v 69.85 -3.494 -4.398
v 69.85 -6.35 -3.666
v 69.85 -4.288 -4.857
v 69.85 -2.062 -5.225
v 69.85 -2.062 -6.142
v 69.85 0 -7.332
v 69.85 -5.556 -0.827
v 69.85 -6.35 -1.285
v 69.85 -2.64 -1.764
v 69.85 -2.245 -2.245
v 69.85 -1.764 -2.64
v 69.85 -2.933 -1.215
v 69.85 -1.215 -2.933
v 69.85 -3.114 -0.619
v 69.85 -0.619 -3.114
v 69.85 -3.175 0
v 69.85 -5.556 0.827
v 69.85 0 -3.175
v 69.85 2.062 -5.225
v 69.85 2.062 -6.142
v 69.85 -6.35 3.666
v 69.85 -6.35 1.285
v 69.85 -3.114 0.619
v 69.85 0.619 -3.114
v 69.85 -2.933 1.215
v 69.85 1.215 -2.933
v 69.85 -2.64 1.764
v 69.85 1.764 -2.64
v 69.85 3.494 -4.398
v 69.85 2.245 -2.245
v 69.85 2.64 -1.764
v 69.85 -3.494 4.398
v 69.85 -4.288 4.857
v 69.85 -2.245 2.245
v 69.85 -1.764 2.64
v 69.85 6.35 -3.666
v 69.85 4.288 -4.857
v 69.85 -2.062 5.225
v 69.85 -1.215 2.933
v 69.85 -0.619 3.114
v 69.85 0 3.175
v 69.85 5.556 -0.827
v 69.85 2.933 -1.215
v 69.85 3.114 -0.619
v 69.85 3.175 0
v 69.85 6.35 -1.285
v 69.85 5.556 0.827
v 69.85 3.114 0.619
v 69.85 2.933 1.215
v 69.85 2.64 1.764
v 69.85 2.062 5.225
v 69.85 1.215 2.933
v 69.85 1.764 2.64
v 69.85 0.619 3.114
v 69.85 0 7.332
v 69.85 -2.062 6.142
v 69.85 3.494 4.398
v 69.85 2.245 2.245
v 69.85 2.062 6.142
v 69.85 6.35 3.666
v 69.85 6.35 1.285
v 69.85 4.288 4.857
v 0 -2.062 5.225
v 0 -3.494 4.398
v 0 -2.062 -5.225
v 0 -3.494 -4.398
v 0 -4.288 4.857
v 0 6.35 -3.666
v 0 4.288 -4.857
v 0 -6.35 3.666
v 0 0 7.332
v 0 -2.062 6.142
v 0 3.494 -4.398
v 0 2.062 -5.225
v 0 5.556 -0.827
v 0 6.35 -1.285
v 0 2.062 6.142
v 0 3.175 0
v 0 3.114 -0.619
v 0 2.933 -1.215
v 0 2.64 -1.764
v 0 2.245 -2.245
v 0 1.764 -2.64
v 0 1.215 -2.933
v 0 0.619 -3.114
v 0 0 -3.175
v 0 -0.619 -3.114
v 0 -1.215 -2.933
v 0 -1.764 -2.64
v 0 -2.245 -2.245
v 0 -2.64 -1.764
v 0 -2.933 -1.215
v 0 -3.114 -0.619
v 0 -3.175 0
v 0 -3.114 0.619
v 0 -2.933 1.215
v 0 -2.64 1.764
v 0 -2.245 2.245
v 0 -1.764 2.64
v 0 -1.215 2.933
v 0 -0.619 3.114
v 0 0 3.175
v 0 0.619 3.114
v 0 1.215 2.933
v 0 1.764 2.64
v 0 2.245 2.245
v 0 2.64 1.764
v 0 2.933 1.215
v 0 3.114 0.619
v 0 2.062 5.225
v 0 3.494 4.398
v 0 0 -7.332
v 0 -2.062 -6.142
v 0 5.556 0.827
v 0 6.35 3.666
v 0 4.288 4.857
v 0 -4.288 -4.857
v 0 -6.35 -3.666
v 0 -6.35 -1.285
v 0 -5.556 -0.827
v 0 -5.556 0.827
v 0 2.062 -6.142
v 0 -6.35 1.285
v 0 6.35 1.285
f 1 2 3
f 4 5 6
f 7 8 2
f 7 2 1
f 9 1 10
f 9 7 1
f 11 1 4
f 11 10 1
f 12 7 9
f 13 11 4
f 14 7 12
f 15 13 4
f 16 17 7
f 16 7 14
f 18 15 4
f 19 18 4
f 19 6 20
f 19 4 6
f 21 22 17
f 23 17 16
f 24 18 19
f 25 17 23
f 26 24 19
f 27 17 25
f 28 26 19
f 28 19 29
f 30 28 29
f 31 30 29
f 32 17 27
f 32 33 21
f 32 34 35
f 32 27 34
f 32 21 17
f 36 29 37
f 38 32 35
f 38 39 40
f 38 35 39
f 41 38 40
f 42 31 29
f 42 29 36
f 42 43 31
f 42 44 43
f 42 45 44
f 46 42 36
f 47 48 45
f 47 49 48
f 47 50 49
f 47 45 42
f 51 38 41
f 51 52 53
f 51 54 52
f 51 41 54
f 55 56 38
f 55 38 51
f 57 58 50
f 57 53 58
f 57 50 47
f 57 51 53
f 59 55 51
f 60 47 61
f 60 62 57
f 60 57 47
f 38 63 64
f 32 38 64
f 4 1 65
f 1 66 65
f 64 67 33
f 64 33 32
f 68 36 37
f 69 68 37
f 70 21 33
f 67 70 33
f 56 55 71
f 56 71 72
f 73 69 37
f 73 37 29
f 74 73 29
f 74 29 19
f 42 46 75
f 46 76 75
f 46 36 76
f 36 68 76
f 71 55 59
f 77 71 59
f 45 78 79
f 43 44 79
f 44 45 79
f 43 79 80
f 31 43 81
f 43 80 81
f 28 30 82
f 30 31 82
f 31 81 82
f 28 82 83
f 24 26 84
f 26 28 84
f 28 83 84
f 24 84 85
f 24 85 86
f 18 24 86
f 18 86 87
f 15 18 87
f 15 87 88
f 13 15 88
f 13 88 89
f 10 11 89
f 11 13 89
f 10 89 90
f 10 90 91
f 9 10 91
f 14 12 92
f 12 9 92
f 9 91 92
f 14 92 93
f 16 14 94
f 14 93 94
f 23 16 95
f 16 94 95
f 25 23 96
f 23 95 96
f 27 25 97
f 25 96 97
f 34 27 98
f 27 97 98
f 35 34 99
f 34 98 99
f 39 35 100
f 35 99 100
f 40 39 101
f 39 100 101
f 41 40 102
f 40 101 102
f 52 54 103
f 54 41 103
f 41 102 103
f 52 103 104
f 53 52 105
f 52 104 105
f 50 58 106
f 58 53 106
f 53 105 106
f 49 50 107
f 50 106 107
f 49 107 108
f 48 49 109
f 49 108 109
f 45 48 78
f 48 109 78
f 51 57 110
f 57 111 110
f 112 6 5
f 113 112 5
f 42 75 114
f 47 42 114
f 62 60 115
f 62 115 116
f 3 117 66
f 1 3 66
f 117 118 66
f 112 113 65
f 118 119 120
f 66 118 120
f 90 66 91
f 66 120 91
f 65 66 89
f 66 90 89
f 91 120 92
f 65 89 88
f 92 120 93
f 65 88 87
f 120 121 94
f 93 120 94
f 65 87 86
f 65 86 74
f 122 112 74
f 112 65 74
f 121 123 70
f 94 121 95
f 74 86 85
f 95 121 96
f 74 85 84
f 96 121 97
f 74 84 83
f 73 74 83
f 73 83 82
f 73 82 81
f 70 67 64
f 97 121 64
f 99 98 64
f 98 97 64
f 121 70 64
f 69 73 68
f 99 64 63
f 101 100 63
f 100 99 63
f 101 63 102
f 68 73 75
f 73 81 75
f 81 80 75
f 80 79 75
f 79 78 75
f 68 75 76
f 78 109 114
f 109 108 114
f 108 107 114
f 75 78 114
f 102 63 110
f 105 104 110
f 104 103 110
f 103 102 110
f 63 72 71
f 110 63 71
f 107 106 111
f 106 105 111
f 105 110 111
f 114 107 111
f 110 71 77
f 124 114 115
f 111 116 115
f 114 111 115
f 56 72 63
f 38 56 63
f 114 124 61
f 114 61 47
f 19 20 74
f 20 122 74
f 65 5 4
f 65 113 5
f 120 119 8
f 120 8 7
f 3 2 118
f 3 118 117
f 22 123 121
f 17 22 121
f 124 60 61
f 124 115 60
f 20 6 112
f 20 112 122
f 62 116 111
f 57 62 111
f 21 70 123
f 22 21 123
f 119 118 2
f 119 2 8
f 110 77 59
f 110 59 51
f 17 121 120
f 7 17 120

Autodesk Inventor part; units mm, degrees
ref_plane "YZ Plane" through (0, 0, 0) normal (1, 0, 0) x (0, 1, 0)
ref_plane "XZ Plane" through (0, 0, 0) normal (0, 1, 0) x (-1, 0, 0)
ref_plane "XY Plane" through (0, 0, 0) normal (0, 0, 1) x (1, 0, 0)
sketch "Sketch1" plane through (0, 0, 0) normal (1, 0, 0) x (0, 1, 0)
  line L0 (6.35, 3.6662) -> (6.35, -3.6662) construction
  line L1 (6.35, -3.6662) -> (0, -7.3323) construction
  line L2 (0, -7.3323) -> (-6.35, -3.6662) construction
  line L3 (-6.35, -3.6662) -> (-6.35, 3.6662) construction
  line L4 (-6.35, 3.6662) -> (0, 7.3323) construction
  line L5 (0, 7.3323) -> (6.35, 3.6662) construction
  line L6 (5.5563, -3.2079) -> (5.5563, 3.2079) construction
  line L7 (5.5563, 3.2079) -> (0, 6.4158) construction
  line L8 (0, 6.4158) -> (-5.5563, 3.2079) construction
  line L9 (-5.5563, 3.2079) -> (-5.5563, -3.2079) construction
  line L10 (-5.5563, -3.2079) -> (0, -6.4158) construction
  line L11 (0, -6.4158) -> (5.5563, -3.2079) construction
  line L12 (6.35, 3.6662) -> (6.35, 1.2849)
  line L13 (6.35, 3.6662) -> (4.2878, 4.8568)
  line L14 (6.35, -3.6662) -> (6.35, -1.2849)
  line L15 (6.35, -3.6662) -> (4.2878, -4.8568)
  line L16 (0, -7.3323) -> (2.0622, -6.1417)
  line L17 (0, -7.3323) -> (-2.0622, -6.1417)
  line L18 (-6.35, -3.6662) -> (-4.2878, -4.8568)
  line L19 (-6.35, -3.6662) -> (-6.35, -1.2849)
  line L20 (-6.35, 3.6662) -> (-6.35, 1.2849)
  line L21 (-6.35, 3.6662) -> (-4.2878, 4.8568)
  line L22 (0, 7.3323) -> (2.0622, 6.1417)
  line L23 (0, 7.3323) -> (-2.0622, 6.1417)
  line L24 (6.35, 1.2849) -> (5.5563, 0.8267)
  line L25 (6.35, 1.2849) -> (7.2665, 1.2849) construction
  line L26 (6.35, -1.2849) -> (5.5563, -0.8267)
  line L27 (6.35, -1.2849) -> (7.2665, -1.2849) construction
  line L28 (5.5563, -0.8267) -> (5.5563, 0.8267)
  line L29 (4.2878, -4.8568) -> (3.494, -4.3985)
  line L30 (4.2878, -4.8568) -> (5.2043, -4.8568) construction
  line L31 (2.0622, -6.1417) -> (2.0622, -5.2252)
  line L32 (2.0622, -6.1417) -> (2.9788, -6.1417) construction
  line L33 (-2.0622, -6.1417) -> (-2.0622, -5.2252)
  line L34 (-2.0622, -6.1417) -> (-1.1457, -6.1417) construction
  line L35 (3.494, -4.3985) -> (2.0622, -5.2252)
  line L36 (-4.2878, -4.8568) -> (-3.494, -4.3985)
  line L37 (-4.2878, -4.8568) -> (-3.3712, -4.8568) construction
  line L38 (-3.494, -4.3985) -> (-2.0622, -5.2252)
  line L39 (-6.35, -1.2849) -> (-5.5563, -0.8267)
  line L40 (-6.35, -1.2849) -> (-5.4335, -1.2849) construction
  line L41 (-6.35, 1.2849) -> (-5.5563, 0.8267)
  line L42 (-6.35, 1.2849) -> (-5.4335, 1.2849) construction
  line L43 (-5.5563, 0.8267) -> (-5.5563, -0.8267)
  line L44 (-4.2878, 4.8568) -> (-3.494, 4.3985)
  line L45 (-4.2878, 4.8568) -> (-3.3712, 4.8568) construction
  line L46 (-2.0622, 6.1417) -> (-2.0622, 5.2252)
  line L47 (-2.0622, 6.1417) -> (-1.1457, 6.1417) construction
  line L48 (-2.0622, 5.2252) -> (-3.494, 4.3985)
  line L49 (2.0622, 6.1417) -> (2.0622, 5.2252)
  line L50 (2.0622, 6.1417) -> (2.9788, 6.1417) construction
  line L51 (4.2878, 4.8568) -> (3.494, 4.3985)
  line L52 (4.2878, 4.8568) -> (5.2043, 4.8568) construction
  line L53 (3.494, 4.3985) -> (2.0622, 5.2252)
  circle A0 centre (0, 0) radius 3.175
  dimension "d0" = 12.7
  dimension "d1" = 12.7
  dimension "d2" = 12.7
  dimension "d3" = 120
  dimension "d4" = 120
  dimension "d5" = 6.35
  dimension "d6" = 6.35
  dimension "d7" = 6.35
  dimension "d11" = 0.7937
  dimension "d12" = 2.3813
  dimension "d13" = 2.3813
  dimension "d14" = 2.3813
  dimension "d15" = 2.3813
  dimension "d16" = 2.3813
  dimension "d17" = 2.3813
  dimension "d18" = 2.3813
  dimension "d19" = 2.3813
  dimension "d20" = 2.3813
  dimension "d21" = 2.3813
  dimension "d22" = 2.3813
  dimension "d23" = 2.3813
  dimension "d24" = 150
  dimension "d25" = 150
  dimension "d26" = 150
  dimension "d27" = 90
  dimension "d28" = 90
  dimension "d29" = 30
  dimension "d30" = 30
  dimension "d31" = 30
  dimension "d32" = 30
  dimension "d33" = 90
  dimension "d34" = 90
  dimension "d35" = 150
  dimension "d36" = 6.35
extrude "Extrusion1" add sketch "Sketch1" along normal blind 69.85
properties part number "churro" material "Aluminum 6061"
